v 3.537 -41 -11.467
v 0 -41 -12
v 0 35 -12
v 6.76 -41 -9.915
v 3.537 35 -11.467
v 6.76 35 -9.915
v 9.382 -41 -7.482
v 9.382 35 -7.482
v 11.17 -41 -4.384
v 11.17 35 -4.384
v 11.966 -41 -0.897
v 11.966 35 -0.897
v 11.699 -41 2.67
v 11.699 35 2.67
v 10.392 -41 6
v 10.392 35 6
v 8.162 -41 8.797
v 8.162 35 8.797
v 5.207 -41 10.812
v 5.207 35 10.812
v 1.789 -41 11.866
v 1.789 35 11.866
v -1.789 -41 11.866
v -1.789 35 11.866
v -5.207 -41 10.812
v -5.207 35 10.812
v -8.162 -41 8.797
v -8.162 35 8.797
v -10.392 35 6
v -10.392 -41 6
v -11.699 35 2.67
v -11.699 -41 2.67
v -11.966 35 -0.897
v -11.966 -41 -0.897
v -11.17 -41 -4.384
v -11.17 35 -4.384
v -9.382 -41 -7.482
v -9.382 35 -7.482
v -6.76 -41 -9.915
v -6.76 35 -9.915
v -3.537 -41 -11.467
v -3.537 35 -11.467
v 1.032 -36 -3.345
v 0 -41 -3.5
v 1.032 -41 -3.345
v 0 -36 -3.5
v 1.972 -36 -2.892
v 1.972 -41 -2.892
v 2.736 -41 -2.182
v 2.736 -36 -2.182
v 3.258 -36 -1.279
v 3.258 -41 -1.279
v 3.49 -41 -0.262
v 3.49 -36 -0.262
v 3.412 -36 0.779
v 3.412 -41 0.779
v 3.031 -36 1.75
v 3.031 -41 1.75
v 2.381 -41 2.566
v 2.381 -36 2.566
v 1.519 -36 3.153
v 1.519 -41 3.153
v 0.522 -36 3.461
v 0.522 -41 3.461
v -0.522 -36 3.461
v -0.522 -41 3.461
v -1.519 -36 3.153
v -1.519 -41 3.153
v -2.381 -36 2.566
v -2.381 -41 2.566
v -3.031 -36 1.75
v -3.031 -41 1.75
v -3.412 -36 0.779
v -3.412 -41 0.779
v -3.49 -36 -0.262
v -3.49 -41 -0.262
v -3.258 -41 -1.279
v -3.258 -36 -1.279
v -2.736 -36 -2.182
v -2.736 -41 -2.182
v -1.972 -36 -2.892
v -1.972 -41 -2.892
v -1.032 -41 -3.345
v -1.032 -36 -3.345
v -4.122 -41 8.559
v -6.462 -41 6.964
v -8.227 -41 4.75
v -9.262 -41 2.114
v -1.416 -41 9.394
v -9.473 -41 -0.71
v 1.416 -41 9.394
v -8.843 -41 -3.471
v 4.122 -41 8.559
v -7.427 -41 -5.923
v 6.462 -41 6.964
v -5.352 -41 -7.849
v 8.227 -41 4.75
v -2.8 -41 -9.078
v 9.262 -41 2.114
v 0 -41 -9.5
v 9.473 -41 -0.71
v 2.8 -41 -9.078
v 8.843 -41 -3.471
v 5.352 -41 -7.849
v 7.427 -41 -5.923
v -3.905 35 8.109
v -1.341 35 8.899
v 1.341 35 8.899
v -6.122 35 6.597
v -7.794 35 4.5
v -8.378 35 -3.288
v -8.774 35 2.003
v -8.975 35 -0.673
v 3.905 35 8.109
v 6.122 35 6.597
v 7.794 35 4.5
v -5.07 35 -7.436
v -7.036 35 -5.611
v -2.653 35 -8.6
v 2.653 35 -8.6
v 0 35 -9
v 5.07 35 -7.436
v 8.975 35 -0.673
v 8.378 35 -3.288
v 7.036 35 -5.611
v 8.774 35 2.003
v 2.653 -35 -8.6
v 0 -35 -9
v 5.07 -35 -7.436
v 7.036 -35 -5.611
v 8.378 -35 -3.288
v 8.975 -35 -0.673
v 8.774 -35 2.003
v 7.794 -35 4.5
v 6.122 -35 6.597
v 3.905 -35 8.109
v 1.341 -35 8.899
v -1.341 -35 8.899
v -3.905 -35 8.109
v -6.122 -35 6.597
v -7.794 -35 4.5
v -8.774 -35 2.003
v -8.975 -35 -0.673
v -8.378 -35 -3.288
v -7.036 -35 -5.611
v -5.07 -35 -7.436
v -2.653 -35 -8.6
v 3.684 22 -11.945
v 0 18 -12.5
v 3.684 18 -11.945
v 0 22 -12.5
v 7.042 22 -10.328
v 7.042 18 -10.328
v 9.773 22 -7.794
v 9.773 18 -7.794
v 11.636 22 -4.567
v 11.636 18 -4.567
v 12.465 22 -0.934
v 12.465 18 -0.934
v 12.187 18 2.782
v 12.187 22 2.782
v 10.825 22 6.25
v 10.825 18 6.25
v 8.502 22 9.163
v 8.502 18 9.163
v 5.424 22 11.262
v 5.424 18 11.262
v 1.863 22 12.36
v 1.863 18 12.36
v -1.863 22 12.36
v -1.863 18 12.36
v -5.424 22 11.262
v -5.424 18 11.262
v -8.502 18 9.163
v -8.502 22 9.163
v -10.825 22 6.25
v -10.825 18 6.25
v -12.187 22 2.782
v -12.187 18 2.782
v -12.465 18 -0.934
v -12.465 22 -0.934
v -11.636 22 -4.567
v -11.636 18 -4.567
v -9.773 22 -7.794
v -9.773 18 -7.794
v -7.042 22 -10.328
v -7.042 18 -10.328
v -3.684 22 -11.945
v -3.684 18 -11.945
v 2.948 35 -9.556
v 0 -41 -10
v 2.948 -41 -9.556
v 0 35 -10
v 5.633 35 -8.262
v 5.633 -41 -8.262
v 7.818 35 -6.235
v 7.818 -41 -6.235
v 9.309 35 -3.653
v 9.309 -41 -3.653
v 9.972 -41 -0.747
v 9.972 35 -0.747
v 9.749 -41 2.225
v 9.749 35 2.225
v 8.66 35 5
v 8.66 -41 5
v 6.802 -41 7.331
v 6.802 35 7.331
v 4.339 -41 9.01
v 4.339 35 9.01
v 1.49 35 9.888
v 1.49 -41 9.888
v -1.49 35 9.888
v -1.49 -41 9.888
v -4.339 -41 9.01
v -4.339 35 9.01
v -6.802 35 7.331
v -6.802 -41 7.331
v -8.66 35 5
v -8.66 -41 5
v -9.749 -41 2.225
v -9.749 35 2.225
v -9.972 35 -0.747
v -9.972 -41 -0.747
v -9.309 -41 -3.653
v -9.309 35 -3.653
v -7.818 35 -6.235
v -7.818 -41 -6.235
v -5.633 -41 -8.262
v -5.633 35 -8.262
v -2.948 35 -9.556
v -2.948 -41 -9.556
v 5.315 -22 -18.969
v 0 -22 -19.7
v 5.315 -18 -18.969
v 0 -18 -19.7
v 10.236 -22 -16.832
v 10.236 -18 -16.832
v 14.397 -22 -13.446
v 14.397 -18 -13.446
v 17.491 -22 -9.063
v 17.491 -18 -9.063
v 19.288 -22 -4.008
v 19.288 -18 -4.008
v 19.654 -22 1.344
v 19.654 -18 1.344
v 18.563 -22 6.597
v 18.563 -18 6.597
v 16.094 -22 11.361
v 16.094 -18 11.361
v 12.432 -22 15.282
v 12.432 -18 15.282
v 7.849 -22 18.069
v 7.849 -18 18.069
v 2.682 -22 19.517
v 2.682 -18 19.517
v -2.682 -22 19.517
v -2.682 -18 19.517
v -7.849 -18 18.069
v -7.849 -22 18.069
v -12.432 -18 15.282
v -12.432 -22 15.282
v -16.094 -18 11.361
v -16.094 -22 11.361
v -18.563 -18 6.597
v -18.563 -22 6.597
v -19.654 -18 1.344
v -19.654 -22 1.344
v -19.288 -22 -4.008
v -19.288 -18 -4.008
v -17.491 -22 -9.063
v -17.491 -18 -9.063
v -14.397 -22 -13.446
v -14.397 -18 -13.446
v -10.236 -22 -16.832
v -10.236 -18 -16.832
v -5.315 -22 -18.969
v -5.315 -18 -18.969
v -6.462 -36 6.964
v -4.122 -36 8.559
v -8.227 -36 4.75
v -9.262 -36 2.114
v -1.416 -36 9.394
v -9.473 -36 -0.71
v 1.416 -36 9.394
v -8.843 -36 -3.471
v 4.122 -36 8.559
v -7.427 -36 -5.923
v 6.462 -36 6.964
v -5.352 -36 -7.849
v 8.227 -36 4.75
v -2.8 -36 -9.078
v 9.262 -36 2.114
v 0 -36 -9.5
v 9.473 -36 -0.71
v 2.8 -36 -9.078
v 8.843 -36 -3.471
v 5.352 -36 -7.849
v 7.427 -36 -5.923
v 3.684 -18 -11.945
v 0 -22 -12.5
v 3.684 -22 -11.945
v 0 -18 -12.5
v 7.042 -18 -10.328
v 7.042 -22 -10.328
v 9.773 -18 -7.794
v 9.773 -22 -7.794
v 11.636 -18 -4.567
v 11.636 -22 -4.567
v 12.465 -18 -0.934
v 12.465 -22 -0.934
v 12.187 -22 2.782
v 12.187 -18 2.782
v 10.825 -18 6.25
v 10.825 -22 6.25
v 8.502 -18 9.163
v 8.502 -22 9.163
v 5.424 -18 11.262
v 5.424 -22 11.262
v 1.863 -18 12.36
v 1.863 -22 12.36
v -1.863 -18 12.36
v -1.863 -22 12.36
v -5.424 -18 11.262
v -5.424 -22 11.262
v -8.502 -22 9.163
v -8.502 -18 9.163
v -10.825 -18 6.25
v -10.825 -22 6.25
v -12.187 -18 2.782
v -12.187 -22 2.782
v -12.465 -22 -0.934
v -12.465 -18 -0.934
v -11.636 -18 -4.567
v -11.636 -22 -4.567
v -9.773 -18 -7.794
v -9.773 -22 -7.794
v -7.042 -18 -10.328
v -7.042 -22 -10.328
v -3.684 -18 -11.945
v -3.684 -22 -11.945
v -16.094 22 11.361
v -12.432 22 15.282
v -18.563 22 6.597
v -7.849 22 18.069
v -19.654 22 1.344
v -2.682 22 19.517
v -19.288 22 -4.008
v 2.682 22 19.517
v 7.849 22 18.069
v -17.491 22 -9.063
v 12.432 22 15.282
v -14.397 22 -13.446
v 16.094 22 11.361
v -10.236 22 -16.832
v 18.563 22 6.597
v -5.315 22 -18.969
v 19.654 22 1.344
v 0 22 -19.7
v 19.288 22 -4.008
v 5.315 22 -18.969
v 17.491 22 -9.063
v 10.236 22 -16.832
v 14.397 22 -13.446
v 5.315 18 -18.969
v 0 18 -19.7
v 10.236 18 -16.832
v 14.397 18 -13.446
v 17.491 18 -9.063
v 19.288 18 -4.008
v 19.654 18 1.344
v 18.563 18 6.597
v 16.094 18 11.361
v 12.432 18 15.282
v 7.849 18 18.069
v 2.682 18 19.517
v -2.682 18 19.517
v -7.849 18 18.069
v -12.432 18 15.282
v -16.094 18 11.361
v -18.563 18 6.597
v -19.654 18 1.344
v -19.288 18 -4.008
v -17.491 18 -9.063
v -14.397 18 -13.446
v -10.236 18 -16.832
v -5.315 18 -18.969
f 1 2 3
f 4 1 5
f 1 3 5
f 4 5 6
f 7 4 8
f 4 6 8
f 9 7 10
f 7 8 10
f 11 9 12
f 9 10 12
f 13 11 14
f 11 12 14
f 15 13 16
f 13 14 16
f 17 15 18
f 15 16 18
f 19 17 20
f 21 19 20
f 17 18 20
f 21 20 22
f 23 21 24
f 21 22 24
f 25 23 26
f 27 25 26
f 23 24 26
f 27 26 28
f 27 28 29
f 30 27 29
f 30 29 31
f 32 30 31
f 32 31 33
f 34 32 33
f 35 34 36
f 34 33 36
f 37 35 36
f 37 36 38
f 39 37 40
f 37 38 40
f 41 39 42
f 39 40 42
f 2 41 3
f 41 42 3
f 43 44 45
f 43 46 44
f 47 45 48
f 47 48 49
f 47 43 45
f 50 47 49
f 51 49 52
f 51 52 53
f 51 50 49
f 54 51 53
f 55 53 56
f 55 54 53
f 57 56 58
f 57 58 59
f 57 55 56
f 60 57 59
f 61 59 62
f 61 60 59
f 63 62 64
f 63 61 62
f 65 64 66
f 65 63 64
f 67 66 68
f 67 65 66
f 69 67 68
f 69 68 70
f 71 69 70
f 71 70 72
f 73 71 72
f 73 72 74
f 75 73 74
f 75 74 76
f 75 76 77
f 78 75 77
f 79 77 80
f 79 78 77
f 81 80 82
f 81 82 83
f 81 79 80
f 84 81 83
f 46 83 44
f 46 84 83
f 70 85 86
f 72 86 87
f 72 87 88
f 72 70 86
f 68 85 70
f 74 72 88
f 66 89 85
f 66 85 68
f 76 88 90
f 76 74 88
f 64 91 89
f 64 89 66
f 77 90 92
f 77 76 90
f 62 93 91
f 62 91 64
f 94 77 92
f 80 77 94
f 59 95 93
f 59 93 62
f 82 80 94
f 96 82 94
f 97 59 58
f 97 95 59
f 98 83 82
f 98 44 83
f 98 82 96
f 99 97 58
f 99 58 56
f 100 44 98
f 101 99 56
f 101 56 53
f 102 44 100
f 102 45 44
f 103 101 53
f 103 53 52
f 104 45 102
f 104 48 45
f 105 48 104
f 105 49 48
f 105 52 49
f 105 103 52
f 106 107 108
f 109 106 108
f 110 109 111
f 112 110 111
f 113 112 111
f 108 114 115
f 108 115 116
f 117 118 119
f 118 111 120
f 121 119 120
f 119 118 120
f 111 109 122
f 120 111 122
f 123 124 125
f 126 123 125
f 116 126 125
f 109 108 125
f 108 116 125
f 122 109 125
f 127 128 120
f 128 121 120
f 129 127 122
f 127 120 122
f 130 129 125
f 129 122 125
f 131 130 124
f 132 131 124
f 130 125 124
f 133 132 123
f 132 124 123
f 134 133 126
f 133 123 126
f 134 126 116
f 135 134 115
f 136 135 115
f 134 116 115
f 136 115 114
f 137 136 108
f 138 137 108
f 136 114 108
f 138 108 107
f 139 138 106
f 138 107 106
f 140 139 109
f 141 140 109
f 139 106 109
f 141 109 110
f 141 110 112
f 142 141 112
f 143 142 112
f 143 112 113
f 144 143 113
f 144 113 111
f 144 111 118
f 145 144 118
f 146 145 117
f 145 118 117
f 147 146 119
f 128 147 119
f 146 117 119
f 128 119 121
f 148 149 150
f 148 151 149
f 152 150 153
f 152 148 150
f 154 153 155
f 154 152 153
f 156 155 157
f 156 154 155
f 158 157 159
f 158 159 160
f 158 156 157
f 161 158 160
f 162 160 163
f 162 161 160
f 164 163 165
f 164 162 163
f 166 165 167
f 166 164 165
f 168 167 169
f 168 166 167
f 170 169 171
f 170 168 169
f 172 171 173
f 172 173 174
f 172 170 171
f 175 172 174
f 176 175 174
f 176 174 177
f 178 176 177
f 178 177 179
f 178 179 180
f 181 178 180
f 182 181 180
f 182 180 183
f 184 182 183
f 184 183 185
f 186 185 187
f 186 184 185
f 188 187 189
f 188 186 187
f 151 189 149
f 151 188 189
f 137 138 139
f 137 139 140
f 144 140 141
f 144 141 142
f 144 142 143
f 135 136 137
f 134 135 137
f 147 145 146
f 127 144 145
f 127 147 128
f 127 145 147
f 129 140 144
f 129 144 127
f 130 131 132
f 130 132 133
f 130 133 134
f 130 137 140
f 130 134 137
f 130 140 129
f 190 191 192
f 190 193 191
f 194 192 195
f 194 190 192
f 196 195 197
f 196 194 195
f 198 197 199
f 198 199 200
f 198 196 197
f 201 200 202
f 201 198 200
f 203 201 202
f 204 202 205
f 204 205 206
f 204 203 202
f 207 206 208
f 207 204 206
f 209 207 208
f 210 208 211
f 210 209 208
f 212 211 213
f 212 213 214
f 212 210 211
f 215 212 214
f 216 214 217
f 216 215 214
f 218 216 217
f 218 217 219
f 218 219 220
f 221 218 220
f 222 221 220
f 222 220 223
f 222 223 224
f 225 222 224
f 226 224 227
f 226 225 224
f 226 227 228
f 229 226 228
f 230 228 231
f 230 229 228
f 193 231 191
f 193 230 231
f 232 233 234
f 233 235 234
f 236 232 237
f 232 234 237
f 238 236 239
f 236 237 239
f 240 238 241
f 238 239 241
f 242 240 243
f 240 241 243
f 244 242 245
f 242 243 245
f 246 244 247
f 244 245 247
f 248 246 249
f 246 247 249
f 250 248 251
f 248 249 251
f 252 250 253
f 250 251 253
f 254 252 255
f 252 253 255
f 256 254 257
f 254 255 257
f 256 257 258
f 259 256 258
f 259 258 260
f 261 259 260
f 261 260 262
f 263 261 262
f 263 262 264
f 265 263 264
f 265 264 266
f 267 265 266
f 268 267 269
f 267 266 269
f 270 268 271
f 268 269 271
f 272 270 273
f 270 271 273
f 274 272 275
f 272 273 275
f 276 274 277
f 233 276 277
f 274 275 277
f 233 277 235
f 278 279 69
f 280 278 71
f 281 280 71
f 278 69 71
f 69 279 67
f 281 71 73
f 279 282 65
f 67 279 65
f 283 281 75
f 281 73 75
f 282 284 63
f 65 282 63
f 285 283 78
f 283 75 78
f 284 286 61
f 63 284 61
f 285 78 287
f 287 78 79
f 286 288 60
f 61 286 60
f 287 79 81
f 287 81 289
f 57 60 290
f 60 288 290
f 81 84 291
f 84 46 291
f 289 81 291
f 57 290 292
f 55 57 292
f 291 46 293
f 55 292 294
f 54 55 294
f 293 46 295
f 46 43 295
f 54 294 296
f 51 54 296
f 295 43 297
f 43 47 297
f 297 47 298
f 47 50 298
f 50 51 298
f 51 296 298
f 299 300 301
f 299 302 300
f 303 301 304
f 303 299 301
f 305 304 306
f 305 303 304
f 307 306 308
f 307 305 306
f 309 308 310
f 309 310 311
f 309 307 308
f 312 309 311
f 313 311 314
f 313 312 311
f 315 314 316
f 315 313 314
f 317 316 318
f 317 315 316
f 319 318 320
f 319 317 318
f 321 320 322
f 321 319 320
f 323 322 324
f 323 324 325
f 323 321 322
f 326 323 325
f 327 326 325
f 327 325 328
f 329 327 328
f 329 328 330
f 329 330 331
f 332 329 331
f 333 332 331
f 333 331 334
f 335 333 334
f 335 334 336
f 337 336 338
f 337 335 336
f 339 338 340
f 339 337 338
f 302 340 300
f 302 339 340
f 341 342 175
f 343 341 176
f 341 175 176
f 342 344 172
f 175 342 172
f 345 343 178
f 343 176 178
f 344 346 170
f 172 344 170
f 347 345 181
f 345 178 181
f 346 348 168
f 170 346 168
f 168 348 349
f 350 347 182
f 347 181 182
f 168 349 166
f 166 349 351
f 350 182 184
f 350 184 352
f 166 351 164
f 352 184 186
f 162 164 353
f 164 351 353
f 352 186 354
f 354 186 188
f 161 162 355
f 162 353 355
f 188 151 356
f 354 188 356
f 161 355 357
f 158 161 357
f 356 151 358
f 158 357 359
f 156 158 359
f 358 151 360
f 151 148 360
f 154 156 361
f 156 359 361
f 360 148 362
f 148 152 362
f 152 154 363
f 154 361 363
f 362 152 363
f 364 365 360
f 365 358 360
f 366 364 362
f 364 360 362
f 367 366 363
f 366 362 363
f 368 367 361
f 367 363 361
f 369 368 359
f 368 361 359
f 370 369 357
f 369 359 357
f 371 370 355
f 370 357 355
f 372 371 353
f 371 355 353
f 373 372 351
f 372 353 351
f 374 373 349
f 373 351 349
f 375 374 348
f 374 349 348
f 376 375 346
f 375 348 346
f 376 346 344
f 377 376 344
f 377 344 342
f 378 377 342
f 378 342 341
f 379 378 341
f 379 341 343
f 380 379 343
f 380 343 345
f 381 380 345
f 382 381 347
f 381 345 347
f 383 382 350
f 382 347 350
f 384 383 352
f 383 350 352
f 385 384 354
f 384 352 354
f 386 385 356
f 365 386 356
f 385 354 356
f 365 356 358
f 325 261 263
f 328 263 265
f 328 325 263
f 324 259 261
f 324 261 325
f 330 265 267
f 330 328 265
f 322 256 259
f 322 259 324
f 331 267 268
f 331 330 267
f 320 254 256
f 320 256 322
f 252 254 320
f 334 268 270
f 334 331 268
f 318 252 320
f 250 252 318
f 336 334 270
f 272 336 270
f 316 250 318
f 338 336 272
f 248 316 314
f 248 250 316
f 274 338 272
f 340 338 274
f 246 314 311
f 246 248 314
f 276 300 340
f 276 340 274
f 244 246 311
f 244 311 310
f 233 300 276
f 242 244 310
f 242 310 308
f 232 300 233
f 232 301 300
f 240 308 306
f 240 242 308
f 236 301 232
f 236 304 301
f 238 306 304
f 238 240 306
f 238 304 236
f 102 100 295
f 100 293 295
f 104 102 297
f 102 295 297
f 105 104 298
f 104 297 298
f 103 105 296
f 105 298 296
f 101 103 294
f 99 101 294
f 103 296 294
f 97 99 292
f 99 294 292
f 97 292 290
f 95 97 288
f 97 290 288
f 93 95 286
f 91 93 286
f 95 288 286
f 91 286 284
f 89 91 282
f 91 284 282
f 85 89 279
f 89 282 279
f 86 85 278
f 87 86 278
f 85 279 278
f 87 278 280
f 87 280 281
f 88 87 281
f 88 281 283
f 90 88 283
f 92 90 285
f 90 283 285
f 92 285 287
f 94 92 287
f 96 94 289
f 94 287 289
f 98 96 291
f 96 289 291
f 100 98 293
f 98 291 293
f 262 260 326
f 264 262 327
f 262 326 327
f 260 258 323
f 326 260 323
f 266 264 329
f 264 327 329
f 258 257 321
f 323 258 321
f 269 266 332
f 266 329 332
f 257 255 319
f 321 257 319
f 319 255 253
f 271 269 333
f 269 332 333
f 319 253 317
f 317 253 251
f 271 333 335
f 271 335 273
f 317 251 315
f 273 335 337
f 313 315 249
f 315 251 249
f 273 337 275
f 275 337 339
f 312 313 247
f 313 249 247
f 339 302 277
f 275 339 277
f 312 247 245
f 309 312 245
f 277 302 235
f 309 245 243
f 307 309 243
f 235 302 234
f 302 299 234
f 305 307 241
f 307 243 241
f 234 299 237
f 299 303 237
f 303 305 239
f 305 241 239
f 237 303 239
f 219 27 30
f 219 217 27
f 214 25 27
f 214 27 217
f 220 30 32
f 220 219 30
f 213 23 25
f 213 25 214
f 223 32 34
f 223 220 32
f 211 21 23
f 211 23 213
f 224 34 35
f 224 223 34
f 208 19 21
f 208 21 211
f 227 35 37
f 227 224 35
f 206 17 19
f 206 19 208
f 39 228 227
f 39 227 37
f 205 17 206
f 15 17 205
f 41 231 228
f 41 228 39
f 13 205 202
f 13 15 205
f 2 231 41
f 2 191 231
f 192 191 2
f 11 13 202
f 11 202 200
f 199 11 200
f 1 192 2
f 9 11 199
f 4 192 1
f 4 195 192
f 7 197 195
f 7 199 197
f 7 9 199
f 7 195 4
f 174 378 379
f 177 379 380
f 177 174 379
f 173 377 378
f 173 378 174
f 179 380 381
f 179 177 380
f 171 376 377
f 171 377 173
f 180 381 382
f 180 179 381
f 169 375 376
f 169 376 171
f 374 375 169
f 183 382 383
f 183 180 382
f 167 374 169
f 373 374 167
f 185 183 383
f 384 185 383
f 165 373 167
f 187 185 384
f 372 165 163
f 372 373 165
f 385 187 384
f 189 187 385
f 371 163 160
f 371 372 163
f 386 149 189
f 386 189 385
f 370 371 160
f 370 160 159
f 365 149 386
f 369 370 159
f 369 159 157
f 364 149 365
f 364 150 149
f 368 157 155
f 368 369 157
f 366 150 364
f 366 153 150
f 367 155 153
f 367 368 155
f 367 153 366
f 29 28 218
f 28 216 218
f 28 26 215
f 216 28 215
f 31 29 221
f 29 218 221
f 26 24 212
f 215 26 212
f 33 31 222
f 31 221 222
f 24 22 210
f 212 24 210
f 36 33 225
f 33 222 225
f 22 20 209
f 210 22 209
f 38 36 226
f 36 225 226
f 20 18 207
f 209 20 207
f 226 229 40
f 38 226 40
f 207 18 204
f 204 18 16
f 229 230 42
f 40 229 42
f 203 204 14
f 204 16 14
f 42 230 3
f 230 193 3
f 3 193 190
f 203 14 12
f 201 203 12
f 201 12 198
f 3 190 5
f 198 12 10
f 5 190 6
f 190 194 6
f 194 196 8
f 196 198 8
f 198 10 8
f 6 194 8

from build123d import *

# Parameters (mm, degrees)
F0_W = 70
F0_H = 9
F2_W = 76
F2_H = 2
F4_W = 4
F4_H = 7.2
F6_W = 5
F6_H = 6


with BuildPart() as f1:
    # F0 (on Right) → F1 (revolve)
    with BuildSketch(Plane.YZ):
        with Locations((0, -4.5)):
            Rectangle(F0_W, F0_H)
    revolve(axis=Axis((0, 0, 0), (0, -1, 0)))


with BuildPart() as f3:
    # F2 (on Right) → F3 (revolve)
    with BuildSketch(Plane.YZ):
        with Locations((-3, -11)):
            Rectangle(F2_W, F2_H)
    revolve(axis=Axis((0, 2.477687, 0), (0, -1, 0)))


with BuildPart() as f5:
    # F4 (on Right) → F5 (revolve)
    with BuildSketch(Plane.YZ):
        with Locations((-20, -16.1)):
            Rectangle(F4_W, F4_H)
        with Locations((20, -16.1)):
            Rectangle(F4_W, F4_H)
    revolve(axis=Axis((0, 2.477687, 0), (0, -1, 0)))


with BuildPart() as f7:
    # F6 (on Right) → F7 (revolve)
    with BuildSketch(Plane.YZ):
        with Locations((-38.5, -6.5)):
            Rectangle(F6_W, F6_H)
    revolve(axis=Axis((0, 2.477687, 0), (0, -1, 0)))


solid = Compound([f1.part, f3.part, f5.part, f7.part])
